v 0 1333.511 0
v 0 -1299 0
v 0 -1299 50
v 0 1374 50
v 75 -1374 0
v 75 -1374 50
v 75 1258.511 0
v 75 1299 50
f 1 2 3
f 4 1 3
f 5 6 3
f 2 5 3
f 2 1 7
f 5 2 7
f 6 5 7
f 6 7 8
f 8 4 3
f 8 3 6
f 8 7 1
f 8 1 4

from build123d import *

# Parameters (mm, degrees)
F0_W     = 75
F0_H     = 50
F1_DEPTH = 1374
F3_DEPTH = 50.001


with BuildPart() as f1:
    # F0 (on Front) → F1 (new body, symmetric)
    with BuildSketch(Plane.XZ):
        with Locations((37.5, 25)):
            Rectangle(F0_W, F0_H)
    extrude(amount=F1_DEPTH, both=True)

    # F2 (on face) → F3 (cut, through all)
    with BuildSketch(Plane.XY.offset(50)):
        Polygon((0, 1374), (75, 1299), (75, 1374), align=None)
        Polygon((0, -1374), (75, -1374), (0, -1299), align=None)
    extrude(amount=-F3_DEPTH, mode=Mode.SUBTRACT)

    # F5: sweep along a path in F5_path
    with BuildLine(Plane(origin=(75, 1299, 0), x_dir=(0.7071067812, -0.7071067812, 0), z_dir=(0.7071067812, 0.7071067812, 0))) as f5_path:
        Line((0, 0), (-106.066017178, 0))
    # F4 (on face) → F5 (sweep, cut)
    with BuildSketch(Plane(origin=(0, 0, 0), x_dir=(0, -1, 0), z_dir=(-1, 0, 0))):
        Polygon((-1333.5107983402, 0), (-1374, 50), (-1374, 0), align=None)
    sweep(path=f5_path.line, mode=Mode.SUBTRACT)


solid = f1.part
